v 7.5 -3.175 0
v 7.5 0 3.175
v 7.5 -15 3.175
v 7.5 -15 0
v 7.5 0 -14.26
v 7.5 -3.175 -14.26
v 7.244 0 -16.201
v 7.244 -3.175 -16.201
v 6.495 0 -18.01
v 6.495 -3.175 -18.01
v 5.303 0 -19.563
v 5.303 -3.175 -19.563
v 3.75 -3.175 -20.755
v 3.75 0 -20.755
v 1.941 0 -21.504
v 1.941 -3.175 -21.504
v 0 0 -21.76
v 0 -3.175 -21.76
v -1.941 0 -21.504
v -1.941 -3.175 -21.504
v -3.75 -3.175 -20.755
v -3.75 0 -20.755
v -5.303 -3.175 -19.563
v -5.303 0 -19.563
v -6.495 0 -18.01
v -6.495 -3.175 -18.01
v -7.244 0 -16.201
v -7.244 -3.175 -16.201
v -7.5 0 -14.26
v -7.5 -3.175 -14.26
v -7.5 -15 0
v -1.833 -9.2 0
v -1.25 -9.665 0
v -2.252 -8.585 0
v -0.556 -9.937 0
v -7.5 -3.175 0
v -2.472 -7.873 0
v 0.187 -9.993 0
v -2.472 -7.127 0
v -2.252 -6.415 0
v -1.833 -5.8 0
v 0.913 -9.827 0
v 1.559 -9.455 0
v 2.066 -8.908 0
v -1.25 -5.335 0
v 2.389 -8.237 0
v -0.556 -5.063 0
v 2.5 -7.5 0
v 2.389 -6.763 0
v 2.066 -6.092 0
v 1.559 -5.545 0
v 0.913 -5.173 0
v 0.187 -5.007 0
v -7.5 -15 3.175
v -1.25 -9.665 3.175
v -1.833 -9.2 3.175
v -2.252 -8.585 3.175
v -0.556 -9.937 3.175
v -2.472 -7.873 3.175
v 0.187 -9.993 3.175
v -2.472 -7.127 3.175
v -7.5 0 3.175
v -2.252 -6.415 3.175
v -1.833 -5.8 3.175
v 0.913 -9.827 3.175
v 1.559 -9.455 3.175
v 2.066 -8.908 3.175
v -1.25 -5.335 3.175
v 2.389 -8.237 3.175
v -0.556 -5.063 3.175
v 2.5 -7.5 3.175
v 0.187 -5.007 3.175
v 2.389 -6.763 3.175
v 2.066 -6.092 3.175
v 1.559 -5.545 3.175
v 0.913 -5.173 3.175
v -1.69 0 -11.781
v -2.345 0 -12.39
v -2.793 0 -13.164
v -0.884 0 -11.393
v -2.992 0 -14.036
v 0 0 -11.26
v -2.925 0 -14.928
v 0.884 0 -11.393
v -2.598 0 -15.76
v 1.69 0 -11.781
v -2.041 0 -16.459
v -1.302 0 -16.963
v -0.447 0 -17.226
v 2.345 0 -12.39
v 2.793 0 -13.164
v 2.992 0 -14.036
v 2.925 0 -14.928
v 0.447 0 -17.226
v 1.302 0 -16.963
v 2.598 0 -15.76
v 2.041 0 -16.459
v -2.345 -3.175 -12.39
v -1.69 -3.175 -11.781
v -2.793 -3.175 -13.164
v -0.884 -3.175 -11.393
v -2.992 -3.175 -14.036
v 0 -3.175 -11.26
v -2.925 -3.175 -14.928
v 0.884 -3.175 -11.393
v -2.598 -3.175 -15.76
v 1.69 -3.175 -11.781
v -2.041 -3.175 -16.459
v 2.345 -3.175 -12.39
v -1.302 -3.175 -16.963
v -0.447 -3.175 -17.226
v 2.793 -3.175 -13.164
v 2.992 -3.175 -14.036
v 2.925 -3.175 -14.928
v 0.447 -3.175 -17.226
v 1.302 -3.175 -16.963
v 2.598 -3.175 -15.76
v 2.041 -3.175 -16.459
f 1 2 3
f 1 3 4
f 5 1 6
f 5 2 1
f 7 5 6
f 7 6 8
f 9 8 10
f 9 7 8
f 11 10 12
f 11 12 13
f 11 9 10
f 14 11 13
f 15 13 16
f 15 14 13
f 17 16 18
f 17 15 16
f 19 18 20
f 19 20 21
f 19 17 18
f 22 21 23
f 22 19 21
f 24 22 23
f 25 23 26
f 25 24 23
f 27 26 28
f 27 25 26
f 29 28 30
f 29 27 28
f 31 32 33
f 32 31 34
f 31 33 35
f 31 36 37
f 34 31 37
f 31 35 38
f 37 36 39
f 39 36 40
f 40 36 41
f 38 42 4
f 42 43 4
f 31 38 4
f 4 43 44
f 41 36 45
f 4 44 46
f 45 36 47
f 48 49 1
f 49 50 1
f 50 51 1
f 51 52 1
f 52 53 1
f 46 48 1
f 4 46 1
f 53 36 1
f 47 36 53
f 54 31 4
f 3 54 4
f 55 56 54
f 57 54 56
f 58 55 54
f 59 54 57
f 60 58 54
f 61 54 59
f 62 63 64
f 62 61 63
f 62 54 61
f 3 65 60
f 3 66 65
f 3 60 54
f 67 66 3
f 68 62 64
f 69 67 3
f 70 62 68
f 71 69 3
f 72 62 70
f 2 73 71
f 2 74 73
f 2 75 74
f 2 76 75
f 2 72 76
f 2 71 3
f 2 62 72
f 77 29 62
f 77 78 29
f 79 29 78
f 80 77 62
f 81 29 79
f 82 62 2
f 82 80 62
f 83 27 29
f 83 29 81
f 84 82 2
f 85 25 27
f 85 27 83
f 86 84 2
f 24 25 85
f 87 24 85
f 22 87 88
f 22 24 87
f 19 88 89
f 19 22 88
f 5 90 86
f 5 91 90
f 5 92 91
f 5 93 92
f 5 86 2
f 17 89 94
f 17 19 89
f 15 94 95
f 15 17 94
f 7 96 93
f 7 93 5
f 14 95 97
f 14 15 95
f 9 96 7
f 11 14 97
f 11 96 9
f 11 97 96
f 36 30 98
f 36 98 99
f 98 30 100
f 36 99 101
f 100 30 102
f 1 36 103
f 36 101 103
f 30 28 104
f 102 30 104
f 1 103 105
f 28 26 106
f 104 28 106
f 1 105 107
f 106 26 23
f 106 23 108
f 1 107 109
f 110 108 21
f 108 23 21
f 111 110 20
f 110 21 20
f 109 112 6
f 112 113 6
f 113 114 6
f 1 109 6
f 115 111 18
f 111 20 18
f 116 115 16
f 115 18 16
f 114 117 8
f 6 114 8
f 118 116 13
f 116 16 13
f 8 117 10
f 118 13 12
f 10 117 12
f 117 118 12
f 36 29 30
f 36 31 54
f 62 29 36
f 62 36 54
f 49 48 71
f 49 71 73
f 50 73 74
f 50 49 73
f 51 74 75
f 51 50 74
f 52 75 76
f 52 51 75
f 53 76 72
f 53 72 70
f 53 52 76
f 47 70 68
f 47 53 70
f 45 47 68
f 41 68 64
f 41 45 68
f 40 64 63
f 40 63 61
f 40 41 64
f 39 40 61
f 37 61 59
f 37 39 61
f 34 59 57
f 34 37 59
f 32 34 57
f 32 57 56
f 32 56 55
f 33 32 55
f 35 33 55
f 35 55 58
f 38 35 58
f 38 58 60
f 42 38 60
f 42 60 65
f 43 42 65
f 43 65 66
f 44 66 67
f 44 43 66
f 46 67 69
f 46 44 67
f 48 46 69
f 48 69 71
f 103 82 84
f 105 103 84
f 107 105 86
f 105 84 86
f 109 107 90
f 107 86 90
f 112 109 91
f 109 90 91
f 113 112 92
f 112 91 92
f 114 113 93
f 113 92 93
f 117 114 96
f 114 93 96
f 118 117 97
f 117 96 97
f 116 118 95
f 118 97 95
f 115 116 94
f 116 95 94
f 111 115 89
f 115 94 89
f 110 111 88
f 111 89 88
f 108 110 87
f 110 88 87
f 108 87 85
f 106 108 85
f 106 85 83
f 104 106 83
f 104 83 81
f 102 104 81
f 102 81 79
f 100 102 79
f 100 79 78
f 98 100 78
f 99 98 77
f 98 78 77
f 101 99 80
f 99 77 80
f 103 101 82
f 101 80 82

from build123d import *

# Parameters (mm, degrees)
SKETCH1_W           = 15
SKETCH1_H           = 15
SKETCH1_R           = 2.5
BOSS_EXTRUDE1_DEPTH = 3.175
SKETCH2_R           = 3
BOSS_EXTRUDE2_DEPTH = 3.175


with BuildPart() as part:
    # Sketch1 → Boss-Extrude1 (new body)
    with BuildSketch(Plane.XY):
        with Locations((0, -7.5)):
            Rectangle(SKETCH1_W, SKETCH1_H)
        with Locations((0, -7.5)):
            Circle(SKETCH1_R, mode=Mode.SUBTRACT)
    extrude(amount=BOSS_EXTRUDE1_DEPTH)

    # Sketch2 → Boss-Extrude2 (add)
    with BuildSketch(Plane(origin=(0, 0, 0), x_dir=(1, 0, 0), z_dir=(0, 1, 0))):
        with BuildLine():
            Line((-7.5, 14.26), (-7.5, 0))
            Line((-7.5, 0), (7.5, 0))
            Line((7.5, 0), (7.5, 14.26))
            ThreePointArc((7.5, 14.26), (0, 21.76), (-7.5, 14.26))
        make_face()
        with Locations(Location((0, 14.26, 0), (0, 0, 270))):
            Circle(SKETCH2_R, mode=Mode.SUBTRACT)
    extrude(amount=-BOSS_EXTRUDE2_DEPTH)


solid = part.part
